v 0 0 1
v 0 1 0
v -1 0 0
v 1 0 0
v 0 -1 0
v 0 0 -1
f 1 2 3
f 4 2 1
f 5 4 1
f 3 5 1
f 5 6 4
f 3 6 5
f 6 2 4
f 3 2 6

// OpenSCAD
//array of 3D points of our convex hull
my_points = [[0,0,1], [0,0,-1], [0,1,0], [0,-1,0], [1,0,0], [-1,0,0]];

//convex hull (by points in polyhedron)
//[[0,1,2,3,4,5]] - is array of faces - one face with six points 
hull()
    polyhedron(my_points, [[0,1,2,3,4,5]]);
